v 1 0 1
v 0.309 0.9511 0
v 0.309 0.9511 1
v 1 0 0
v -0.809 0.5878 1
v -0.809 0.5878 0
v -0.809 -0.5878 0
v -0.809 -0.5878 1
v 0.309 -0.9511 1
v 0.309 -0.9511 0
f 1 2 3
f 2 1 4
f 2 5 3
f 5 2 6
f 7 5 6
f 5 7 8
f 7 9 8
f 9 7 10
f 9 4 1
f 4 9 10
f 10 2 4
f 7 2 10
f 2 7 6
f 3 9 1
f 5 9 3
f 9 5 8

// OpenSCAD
function my_function(x = 1) = x;

module my_cylinder(r = my_function())
  cylinder();

my_cylinder();
